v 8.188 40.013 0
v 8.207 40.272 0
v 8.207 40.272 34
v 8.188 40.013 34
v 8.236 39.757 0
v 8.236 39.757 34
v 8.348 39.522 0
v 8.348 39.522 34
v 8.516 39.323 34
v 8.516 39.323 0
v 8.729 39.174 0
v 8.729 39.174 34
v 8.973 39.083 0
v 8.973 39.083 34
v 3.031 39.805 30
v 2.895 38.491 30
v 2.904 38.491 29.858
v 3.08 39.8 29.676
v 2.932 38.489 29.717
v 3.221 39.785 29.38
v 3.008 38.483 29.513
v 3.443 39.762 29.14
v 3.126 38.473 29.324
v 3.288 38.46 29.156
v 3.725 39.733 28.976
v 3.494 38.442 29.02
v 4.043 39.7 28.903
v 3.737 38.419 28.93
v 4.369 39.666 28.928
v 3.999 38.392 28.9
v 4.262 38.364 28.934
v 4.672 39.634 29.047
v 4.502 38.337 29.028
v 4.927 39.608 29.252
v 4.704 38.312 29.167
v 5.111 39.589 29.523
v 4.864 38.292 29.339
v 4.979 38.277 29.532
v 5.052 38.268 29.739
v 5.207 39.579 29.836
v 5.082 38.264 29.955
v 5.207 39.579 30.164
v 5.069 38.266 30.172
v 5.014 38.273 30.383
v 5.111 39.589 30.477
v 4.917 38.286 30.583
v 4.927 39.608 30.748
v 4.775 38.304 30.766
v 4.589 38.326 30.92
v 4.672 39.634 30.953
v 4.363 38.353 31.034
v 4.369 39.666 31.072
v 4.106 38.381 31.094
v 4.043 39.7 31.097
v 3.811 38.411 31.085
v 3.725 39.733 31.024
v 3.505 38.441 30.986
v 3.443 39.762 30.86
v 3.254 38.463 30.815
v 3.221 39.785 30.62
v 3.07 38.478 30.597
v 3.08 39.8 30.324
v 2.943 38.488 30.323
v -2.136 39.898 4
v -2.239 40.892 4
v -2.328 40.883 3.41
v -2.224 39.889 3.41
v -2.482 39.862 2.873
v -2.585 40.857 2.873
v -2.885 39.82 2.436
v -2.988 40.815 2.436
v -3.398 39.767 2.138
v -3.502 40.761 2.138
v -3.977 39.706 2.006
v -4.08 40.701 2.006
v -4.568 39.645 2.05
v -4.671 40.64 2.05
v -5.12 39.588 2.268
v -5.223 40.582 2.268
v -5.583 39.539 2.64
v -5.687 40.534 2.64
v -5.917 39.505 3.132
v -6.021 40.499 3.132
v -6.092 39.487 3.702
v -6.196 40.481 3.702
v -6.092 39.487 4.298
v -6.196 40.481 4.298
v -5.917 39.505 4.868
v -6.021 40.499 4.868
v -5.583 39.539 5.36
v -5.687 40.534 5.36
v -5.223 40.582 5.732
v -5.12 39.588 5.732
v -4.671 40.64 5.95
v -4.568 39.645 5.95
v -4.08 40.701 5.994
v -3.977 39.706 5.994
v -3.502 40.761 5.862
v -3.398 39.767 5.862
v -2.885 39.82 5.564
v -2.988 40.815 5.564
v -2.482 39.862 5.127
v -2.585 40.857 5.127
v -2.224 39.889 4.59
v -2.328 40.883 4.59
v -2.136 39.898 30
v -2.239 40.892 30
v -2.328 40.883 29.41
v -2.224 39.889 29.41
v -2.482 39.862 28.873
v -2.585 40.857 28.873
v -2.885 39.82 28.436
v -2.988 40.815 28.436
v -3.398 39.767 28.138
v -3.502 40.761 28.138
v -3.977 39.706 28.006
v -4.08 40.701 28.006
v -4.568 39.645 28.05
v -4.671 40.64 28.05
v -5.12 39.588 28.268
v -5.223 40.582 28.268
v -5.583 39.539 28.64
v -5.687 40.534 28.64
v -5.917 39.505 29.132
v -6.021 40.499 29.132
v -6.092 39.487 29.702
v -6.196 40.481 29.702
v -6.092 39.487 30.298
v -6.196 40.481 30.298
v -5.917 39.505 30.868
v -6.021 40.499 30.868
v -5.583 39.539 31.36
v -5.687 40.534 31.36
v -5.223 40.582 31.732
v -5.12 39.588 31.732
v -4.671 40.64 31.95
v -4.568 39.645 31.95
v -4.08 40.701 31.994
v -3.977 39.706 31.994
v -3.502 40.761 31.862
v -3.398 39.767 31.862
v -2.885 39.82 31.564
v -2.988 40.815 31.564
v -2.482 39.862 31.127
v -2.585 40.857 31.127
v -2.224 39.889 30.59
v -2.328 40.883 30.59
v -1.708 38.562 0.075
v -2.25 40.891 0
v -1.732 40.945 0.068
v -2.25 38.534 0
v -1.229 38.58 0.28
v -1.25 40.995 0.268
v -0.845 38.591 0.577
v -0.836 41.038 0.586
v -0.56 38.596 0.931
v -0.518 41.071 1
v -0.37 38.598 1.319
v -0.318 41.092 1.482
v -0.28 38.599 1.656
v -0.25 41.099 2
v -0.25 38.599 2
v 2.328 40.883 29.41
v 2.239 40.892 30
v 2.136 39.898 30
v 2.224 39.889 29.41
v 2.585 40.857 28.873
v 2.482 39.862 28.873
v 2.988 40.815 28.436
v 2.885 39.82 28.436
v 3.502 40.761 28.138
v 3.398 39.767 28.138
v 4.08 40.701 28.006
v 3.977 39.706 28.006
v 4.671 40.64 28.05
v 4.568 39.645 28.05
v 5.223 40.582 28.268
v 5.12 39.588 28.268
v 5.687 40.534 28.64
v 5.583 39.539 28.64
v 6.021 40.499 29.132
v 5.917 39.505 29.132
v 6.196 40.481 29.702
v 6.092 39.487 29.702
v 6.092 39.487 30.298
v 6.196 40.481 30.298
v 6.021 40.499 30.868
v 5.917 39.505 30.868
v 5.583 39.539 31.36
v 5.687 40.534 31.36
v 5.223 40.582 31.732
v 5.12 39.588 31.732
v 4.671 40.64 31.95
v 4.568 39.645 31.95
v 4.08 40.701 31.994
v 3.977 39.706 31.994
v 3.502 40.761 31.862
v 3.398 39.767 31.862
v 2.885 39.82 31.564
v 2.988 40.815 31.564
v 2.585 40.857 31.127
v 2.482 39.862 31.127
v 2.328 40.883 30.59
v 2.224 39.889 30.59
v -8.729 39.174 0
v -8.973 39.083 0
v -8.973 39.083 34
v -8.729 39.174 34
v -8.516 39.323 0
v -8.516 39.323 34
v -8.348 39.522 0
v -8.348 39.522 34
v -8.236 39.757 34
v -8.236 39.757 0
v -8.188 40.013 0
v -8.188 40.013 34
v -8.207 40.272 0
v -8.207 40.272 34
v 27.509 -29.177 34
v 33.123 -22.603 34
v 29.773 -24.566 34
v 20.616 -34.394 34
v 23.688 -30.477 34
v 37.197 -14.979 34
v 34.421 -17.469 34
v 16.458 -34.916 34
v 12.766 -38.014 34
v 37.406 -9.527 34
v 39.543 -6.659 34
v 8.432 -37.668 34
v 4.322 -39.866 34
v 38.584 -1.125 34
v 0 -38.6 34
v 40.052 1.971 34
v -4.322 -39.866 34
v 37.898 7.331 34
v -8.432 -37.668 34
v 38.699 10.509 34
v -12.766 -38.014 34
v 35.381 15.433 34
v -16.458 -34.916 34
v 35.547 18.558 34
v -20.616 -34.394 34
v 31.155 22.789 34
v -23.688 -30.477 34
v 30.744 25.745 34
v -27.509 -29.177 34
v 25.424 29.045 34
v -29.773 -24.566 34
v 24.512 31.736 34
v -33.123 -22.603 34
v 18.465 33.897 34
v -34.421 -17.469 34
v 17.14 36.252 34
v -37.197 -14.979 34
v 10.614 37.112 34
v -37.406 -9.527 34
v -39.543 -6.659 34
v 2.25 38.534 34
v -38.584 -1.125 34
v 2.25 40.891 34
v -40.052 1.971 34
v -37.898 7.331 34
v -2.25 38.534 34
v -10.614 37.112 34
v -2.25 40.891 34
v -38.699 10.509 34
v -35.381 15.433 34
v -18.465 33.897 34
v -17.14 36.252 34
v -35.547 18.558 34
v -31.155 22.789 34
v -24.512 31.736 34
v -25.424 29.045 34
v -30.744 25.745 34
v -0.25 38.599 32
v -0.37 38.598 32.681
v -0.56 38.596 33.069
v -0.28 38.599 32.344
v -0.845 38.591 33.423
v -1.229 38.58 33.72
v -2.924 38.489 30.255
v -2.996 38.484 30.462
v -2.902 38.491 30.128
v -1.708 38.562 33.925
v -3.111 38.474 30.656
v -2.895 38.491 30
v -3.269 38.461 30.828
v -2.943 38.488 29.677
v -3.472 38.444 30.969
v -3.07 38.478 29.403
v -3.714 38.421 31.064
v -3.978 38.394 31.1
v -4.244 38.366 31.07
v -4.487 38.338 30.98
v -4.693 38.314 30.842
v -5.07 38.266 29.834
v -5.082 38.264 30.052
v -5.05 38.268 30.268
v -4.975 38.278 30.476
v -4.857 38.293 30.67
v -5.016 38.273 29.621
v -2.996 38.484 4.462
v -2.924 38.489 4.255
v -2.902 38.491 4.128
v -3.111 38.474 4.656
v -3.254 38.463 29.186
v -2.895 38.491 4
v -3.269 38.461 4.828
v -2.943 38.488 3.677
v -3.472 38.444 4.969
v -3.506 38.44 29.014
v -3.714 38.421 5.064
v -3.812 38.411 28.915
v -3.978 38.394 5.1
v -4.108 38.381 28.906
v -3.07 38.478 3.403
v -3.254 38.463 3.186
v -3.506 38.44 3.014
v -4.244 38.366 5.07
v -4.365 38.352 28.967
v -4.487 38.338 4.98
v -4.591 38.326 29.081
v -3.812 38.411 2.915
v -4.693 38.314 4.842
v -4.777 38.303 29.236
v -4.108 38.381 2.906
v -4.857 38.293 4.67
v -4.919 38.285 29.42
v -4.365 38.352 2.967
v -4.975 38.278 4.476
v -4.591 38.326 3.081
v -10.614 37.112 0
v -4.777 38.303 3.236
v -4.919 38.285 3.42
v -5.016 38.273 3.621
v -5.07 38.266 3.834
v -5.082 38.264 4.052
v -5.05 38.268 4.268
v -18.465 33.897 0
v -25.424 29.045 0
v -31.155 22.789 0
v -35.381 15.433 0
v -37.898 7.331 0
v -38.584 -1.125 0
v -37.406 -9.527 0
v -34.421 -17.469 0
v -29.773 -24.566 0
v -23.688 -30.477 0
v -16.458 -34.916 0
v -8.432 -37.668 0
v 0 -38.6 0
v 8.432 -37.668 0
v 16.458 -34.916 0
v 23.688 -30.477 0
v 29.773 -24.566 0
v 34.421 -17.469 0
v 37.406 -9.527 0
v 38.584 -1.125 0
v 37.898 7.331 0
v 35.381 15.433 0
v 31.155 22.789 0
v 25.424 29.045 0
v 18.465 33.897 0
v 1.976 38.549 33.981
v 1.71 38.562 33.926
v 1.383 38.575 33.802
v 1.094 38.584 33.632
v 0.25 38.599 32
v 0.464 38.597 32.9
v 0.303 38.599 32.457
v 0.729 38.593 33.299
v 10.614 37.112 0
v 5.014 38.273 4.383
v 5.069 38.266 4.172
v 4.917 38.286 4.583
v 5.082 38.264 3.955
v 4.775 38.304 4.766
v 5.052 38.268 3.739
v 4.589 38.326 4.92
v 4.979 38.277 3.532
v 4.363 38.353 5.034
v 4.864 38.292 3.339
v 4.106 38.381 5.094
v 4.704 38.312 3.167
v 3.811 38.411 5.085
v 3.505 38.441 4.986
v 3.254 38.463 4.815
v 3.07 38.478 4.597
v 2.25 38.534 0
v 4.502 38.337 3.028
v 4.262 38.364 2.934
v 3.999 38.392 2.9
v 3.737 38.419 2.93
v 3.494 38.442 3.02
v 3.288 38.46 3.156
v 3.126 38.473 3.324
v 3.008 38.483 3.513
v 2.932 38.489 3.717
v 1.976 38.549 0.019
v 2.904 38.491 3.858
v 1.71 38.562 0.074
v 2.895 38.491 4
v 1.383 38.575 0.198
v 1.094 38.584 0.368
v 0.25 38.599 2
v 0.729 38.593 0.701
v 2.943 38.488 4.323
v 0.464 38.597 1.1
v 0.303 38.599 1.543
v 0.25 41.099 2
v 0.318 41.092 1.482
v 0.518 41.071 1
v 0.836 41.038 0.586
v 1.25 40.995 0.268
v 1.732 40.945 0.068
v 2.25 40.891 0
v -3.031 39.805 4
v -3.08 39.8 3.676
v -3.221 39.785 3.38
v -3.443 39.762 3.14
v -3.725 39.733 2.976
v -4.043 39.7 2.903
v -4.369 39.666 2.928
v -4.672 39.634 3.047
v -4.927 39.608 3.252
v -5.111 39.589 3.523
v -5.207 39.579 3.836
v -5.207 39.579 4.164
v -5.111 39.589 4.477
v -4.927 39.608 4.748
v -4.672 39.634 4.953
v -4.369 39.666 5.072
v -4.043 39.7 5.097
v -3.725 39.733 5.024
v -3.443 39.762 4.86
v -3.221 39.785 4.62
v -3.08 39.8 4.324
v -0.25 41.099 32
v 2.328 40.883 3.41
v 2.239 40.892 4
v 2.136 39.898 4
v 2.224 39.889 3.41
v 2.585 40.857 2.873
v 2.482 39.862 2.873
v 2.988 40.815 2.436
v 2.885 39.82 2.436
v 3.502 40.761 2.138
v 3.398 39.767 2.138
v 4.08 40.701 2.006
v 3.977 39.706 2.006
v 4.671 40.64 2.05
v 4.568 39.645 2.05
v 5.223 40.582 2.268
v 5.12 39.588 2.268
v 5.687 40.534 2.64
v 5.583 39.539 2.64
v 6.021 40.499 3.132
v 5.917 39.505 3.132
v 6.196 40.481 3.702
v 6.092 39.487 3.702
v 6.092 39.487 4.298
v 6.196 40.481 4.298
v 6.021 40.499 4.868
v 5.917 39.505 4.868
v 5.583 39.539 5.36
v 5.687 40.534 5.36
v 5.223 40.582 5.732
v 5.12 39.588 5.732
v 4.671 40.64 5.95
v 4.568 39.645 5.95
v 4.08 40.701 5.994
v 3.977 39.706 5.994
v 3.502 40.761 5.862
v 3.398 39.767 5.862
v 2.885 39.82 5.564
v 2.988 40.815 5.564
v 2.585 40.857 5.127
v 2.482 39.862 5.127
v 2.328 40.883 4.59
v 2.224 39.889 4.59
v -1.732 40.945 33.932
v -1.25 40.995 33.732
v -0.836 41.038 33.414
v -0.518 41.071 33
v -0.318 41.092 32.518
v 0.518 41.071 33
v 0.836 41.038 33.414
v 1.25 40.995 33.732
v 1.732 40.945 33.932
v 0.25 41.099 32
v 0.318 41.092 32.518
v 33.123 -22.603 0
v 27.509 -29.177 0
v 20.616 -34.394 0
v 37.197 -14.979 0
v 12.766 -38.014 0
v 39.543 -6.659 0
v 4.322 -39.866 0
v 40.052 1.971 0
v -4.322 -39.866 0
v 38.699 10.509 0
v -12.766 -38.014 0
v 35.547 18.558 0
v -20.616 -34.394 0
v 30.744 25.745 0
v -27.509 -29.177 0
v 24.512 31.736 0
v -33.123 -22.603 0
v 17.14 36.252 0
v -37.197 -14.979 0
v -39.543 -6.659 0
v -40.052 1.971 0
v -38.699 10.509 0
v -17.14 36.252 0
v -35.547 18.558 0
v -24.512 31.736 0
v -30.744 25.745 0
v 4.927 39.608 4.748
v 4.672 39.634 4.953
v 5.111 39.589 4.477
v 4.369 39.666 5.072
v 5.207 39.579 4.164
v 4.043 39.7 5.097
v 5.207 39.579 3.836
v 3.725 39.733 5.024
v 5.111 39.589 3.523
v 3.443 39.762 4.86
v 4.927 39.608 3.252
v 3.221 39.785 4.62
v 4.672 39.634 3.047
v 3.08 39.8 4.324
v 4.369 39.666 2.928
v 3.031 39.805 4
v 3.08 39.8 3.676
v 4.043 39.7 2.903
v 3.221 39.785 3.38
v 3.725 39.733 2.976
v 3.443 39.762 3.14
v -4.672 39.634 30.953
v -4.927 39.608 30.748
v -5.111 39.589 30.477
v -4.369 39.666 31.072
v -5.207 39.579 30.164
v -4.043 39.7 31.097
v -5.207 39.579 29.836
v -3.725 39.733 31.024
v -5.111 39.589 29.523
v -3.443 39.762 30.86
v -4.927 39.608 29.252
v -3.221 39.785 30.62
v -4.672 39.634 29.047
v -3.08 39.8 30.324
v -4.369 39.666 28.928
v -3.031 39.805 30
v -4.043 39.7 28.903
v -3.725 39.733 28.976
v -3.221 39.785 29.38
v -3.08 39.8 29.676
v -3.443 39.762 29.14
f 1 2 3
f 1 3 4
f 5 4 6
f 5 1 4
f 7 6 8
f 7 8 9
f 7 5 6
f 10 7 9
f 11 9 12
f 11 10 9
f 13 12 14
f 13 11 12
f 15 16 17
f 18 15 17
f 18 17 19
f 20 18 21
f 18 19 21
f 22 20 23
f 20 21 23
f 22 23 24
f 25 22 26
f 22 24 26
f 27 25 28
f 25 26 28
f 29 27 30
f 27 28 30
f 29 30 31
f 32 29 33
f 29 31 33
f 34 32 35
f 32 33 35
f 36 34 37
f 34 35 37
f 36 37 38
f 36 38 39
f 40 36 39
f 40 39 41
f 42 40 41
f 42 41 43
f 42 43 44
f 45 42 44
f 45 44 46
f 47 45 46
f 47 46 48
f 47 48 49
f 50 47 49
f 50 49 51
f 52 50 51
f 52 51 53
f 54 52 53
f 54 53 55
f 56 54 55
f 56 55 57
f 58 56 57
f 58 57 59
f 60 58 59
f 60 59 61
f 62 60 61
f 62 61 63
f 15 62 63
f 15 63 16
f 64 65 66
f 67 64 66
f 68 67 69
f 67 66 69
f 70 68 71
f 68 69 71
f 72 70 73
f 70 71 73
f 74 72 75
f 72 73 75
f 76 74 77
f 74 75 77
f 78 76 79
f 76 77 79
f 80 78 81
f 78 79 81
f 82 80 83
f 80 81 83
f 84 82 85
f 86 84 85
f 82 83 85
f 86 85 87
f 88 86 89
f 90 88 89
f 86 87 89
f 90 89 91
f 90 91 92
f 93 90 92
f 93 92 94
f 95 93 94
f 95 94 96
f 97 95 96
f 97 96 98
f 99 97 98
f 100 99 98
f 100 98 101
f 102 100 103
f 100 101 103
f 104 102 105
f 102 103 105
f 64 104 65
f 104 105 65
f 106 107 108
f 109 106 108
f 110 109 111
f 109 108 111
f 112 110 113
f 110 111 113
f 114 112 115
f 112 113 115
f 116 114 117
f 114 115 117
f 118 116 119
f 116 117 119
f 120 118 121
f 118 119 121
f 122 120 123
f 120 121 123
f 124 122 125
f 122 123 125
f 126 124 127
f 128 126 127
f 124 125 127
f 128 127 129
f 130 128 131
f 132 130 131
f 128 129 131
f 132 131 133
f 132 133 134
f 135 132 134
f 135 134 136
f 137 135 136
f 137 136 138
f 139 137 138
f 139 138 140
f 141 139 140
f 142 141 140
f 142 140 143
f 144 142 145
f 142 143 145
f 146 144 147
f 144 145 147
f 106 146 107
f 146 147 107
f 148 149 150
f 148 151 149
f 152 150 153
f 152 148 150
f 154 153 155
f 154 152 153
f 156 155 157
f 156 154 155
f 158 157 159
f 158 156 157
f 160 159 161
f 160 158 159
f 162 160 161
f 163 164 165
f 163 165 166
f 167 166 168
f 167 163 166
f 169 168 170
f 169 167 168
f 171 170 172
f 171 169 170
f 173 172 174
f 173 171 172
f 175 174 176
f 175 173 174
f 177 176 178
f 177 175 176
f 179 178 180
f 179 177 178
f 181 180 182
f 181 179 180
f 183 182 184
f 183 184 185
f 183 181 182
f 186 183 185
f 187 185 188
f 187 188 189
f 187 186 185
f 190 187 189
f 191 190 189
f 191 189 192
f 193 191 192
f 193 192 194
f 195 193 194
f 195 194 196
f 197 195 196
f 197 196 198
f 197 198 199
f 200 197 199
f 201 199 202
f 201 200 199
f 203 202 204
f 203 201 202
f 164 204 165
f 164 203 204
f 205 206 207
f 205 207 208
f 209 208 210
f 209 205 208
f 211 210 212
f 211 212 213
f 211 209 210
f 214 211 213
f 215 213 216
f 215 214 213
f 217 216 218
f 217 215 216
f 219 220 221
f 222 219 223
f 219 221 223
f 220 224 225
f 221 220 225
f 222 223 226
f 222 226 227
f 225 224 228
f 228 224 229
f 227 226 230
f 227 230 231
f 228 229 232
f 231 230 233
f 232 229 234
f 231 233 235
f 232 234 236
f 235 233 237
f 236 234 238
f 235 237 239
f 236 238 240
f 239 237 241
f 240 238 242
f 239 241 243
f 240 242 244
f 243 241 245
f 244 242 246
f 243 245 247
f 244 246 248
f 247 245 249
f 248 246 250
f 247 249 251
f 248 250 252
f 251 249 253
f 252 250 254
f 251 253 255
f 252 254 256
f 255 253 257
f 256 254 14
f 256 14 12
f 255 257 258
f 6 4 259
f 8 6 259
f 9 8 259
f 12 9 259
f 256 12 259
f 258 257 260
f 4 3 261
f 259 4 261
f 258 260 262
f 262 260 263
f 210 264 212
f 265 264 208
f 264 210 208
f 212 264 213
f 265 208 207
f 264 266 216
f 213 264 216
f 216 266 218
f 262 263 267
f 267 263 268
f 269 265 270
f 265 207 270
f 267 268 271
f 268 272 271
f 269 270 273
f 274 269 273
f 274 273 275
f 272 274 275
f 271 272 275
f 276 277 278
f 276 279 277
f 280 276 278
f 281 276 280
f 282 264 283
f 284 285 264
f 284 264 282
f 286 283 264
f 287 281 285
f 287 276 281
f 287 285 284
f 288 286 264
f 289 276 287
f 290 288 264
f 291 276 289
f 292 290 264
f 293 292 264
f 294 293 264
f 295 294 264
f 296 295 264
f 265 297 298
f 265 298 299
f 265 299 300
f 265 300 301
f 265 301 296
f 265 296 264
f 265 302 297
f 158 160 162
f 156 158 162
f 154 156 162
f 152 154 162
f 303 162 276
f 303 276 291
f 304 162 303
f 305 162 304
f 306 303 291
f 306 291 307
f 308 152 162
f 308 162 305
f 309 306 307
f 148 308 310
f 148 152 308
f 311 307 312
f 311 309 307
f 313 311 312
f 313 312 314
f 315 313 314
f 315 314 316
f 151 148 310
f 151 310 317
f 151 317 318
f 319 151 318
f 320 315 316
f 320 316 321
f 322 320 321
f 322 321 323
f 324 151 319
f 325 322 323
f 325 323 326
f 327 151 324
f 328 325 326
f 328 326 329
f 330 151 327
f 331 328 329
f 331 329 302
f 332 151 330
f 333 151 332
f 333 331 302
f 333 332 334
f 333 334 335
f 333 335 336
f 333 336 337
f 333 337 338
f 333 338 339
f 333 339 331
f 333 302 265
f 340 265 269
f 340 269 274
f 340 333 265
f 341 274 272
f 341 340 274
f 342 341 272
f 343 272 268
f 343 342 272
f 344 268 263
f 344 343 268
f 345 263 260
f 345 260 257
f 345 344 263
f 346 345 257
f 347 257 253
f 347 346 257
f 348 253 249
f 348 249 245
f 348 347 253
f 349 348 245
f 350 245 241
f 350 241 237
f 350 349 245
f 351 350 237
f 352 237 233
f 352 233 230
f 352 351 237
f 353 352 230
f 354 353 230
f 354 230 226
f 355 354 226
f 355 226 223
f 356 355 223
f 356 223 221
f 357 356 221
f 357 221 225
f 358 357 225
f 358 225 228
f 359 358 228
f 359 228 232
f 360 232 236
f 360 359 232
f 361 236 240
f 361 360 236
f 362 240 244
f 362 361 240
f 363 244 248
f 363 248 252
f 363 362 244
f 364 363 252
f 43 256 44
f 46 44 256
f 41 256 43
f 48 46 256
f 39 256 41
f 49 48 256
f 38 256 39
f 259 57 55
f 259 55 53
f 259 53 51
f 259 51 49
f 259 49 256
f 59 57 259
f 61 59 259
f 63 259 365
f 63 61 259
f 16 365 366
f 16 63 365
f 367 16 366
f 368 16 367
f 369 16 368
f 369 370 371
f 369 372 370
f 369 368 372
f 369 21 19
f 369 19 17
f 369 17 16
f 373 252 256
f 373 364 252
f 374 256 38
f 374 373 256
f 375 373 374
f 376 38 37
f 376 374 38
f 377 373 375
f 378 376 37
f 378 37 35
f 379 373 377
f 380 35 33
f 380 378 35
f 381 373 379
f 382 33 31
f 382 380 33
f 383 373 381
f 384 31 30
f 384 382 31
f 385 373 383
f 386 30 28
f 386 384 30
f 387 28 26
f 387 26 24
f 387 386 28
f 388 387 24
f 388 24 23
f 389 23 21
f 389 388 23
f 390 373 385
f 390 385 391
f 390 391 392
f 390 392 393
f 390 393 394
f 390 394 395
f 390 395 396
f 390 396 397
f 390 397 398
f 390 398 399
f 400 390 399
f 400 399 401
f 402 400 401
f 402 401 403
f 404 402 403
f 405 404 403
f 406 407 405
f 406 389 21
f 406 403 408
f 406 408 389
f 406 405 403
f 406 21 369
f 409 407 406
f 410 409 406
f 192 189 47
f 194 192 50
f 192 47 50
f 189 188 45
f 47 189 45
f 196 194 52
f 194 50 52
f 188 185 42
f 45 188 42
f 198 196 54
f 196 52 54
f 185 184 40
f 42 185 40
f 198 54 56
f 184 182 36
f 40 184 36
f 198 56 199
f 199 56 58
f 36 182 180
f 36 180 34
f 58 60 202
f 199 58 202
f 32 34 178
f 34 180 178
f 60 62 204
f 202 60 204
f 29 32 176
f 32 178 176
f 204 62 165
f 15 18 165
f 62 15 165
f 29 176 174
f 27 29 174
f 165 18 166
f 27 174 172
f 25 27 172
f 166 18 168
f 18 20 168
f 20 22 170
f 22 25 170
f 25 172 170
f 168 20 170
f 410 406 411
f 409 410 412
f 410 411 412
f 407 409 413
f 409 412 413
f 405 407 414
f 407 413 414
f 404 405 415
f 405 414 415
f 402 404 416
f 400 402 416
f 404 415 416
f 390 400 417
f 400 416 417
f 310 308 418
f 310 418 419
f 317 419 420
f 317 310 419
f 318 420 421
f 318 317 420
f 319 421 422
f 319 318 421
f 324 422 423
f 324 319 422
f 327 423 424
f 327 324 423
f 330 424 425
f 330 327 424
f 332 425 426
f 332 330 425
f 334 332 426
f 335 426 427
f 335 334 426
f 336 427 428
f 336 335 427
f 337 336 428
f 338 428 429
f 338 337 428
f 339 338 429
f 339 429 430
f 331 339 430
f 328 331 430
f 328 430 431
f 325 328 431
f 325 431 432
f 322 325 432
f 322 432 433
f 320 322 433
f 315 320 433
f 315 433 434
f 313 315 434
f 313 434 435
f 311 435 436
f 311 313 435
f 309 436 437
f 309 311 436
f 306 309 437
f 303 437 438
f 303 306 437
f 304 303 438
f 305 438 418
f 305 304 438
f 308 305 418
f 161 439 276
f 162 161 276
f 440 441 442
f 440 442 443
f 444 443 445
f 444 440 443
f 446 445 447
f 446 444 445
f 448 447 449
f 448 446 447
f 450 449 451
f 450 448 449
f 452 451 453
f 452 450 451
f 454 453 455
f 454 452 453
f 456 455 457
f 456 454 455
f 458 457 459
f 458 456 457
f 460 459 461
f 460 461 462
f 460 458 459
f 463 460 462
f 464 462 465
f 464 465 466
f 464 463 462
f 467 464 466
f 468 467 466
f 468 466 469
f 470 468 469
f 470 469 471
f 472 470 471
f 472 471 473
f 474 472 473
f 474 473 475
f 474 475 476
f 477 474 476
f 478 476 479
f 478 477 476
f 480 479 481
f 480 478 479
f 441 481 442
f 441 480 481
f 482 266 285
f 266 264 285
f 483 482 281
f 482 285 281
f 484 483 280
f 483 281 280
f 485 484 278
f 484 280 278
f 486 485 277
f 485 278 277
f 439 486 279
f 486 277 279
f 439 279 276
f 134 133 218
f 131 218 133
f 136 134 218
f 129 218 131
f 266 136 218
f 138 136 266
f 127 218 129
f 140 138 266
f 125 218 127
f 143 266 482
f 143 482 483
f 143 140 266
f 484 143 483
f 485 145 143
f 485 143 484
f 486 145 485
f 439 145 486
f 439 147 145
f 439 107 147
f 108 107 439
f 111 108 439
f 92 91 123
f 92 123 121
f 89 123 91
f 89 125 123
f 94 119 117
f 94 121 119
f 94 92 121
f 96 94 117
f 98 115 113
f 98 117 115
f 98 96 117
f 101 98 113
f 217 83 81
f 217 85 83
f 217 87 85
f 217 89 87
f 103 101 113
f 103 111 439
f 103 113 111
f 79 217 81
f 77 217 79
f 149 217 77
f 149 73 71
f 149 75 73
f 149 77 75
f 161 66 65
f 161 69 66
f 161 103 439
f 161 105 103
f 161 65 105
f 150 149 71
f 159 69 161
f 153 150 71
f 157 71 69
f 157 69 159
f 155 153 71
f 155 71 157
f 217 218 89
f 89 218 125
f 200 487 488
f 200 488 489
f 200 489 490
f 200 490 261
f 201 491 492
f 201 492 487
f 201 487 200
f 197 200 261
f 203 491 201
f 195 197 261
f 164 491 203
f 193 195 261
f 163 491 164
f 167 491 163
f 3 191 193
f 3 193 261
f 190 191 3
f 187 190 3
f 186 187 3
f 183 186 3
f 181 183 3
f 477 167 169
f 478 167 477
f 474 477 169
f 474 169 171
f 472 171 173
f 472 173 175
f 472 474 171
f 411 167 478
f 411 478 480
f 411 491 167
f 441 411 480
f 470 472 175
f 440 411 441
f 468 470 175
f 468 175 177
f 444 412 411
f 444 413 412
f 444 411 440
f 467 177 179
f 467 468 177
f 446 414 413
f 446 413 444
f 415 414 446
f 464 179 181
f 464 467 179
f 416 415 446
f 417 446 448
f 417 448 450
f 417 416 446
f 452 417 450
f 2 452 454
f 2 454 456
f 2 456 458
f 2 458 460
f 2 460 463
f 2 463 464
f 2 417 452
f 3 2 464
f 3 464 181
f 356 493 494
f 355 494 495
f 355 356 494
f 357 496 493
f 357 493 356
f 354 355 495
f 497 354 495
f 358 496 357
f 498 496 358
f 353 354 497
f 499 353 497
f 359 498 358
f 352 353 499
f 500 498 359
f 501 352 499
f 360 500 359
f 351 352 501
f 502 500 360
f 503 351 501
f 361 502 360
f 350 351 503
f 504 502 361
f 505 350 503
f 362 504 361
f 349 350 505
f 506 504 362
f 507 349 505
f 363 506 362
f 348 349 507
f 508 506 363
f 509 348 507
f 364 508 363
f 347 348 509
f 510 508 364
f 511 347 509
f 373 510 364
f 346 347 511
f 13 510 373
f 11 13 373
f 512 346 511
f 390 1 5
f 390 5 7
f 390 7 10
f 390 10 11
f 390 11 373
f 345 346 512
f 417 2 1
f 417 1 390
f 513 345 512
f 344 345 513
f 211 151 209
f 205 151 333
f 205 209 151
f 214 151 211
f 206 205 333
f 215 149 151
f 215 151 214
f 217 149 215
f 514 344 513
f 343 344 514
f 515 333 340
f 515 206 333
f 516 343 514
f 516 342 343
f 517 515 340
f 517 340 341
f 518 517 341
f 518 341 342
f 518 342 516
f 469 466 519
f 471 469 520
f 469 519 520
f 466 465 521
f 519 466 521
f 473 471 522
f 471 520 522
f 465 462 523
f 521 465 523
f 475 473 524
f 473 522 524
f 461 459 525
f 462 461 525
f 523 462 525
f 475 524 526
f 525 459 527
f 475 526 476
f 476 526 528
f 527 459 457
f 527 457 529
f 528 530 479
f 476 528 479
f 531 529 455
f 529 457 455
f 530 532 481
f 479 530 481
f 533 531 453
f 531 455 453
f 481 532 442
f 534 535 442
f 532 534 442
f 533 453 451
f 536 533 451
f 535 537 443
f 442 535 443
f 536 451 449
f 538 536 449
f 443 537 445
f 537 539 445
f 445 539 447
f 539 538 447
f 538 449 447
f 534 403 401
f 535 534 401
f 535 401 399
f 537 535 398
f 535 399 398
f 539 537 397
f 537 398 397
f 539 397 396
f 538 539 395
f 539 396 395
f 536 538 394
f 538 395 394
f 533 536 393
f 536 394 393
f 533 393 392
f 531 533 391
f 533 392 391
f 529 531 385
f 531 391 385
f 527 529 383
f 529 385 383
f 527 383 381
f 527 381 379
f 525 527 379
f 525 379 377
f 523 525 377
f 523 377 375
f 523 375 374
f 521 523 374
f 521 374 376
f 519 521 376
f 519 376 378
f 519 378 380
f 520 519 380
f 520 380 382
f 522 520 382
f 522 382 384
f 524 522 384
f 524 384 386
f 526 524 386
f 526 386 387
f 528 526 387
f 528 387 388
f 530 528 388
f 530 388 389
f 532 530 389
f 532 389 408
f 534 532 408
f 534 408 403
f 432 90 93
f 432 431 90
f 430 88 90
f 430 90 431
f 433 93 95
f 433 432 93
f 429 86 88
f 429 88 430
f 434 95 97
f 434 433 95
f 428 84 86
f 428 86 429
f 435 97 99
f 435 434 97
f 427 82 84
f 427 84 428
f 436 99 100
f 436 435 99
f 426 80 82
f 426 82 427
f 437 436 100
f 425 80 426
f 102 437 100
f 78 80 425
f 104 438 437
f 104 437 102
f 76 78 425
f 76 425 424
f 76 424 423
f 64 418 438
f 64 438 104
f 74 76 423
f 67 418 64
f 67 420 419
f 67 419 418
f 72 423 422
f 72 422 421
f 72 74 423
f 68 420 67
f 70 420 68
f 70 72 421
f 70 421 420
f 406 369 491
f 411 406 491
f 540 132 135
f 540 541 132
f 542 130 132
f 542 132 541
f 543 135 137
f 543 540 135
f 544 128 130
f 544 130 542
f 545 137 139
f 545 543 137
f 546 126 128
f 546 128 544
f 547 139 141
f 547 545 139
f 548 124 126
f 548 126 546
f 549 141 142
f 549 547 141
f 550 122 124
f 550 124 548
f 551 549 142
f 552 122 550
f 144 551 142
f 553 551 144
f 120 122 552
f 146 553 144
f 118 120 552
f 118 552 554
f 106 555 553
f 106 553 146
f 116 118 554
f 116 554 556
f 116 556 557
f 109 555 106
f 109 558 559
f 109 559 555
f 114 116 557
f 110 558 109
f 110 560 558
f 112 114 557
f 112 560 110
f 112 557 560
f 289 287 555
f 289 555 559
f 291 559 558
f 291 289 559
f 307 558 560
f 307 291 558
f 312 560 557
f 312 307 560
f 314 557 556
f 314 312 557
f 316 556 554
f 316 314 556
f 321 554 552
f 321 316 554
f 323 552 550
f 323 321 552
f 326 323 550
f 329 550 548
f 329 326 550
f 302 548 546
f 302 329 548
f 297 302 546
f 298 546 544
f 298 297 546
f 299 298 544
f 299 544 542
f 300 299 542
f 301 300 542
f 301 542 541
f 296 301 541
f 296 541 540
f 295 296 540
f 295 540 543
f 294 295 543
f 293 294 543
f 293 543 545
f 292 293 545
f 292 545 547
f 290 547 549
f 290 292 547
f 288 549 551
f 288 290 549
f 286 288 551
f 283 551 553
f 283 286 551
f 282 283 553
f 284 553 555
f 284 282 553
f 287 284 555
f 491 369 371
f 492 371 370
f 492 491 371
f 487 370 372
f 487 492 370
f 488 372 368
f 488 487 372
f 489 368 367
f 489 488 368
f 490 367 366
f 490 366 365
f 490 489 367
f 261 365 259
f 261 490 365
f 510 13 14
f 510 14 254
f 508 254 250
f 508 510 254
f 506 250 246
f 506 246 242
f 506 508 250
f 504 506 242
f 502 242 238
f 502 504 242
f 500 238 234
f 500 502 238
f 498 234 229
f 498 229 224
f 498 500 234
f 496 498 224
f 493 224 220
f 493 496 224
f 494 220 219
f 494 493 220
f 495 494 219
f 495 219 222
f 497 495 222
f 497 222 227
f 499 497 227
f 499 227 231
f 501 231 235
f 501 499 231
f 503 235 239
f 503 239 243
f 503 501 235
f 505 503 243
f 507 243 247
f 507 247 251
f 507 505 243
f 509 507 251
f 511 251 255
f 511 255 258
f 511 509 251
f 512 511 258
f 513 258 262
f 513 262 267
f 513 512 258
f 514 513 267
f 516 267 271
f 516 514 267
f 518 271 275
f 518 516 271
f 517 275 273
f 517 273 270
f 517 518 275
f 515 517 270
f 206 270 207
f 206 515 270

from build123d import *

# Parameters (mm, degrees)
BOSS_EXTRUDE1_DEPTH = 34
CUT_EXTRUDE2_START  = -2.320517
SKETCH3_R           = 1.1
CUT_EXTRUDE2_DEPTH  = 2.320517
SKETCH4_R           = 2
CUT_EXTRUDE3_DEPTH  = 1
FILLET1_R           = 2


with BuildPart() as part:
    # Sketch1 → Boss-Extrude1 (new body)
    with BuildSketch(Plane.XY):
        with BuildLine():
            Line((0.25, 38.599190406), (0.25, 41.099190406))
            Line((0.25, 41.099190406), (8.207138981, 40.272184219))
            ThreePointArc((8.207138981, 40.272184219), (8.347930101, 39.521941532), (8.972631806, 39.083268523))
            ThreePointArc((8.972631806, 39.083268523), (0, -40.1), (-8.972631806, 39.083268523))
            ThreePointArc((-8.972631806, 39.083268523), (-8.347930101, 39.521941532), (-8.207138981, 40.272184219))
            Line((-8.207138981, 40.272184219), (-0.25, 41.099190406))
            Line((-0.25, 41.099190406), (-0.25, 38.599190406))
            ThreePointArc((-0.25, 38.599190406), (0, -38.6), (0.25, 38.599190406))
        make_face()
    extrude(amount=BOSS_EXTRUDE1_DEPTH)

    # Sketch3 → Cut-Extrude2 (cut)
    with BuildSketch(Plane(origin=(-4.228569491, 40.685687313, 0), x_dir=(0.994642373, 0.103375773, 0), z_dir=(-0.103375773, 0.994642373, 0)).offset(CUT_EXTRUDE2_START)):
        with Locations((0, -4)):
            Circle(SKETCH3_R)
        with Locations((0, -30)):
            Circle(SKETCH3_R)
    cut_extrude2 = extrude(amount=CUT_EXTRUDE2_DEPTH, mode=Mode.SUBTRACT)

    # Sketch4 → Cut-Extrude3 (cut)
    with BuildSketch(Plane(origin=(-4.228569491, 40.685687313, 0), x_dir=(0.994642373, 0.103375773, 0), z_dir=(-0.103375773, 0.994642373, 0))):
        with Locations((0, -4)):
            Circle(SKETCH4_R)
        with Locations((0, -30)):
            Circle(SKETCH4_R)
    cut_extrude3 = extrude(amount=-CUT_EXTRUDE3_DEPTH, mode=Mode.SUBTRACT)

    # Mirror3: Cut-Extrude2, Cut-Extrude3 across plane
    add(cut_extrude2.mirror(Plane(origin=(0, 0, 0), x_dir=(0, 0, 1), z_dir=(1, 0, 0))), mode=Mode.SUBTRACT)
    add(cut_extrude3.mirror(Plane(origin=(0, 0, 0), x_dir=(0, 0, 1), z_dir=(1, 0, 0))), mode=Mode.SUBTRACT)

    # Fillet1
    fillet1_edges = [part.edges().sort_by_distance(p)[0] for p in [
        (-0.25, 39.849190406, 0),
        (0.25, 39.849190406, 34),
        (0.25, 39.849190406, 0),
        (-0.25, 39.849190406, 34),
    ]]
    fillet(fillet1_edges, radius=FILLET1_R)


solid = part.part
